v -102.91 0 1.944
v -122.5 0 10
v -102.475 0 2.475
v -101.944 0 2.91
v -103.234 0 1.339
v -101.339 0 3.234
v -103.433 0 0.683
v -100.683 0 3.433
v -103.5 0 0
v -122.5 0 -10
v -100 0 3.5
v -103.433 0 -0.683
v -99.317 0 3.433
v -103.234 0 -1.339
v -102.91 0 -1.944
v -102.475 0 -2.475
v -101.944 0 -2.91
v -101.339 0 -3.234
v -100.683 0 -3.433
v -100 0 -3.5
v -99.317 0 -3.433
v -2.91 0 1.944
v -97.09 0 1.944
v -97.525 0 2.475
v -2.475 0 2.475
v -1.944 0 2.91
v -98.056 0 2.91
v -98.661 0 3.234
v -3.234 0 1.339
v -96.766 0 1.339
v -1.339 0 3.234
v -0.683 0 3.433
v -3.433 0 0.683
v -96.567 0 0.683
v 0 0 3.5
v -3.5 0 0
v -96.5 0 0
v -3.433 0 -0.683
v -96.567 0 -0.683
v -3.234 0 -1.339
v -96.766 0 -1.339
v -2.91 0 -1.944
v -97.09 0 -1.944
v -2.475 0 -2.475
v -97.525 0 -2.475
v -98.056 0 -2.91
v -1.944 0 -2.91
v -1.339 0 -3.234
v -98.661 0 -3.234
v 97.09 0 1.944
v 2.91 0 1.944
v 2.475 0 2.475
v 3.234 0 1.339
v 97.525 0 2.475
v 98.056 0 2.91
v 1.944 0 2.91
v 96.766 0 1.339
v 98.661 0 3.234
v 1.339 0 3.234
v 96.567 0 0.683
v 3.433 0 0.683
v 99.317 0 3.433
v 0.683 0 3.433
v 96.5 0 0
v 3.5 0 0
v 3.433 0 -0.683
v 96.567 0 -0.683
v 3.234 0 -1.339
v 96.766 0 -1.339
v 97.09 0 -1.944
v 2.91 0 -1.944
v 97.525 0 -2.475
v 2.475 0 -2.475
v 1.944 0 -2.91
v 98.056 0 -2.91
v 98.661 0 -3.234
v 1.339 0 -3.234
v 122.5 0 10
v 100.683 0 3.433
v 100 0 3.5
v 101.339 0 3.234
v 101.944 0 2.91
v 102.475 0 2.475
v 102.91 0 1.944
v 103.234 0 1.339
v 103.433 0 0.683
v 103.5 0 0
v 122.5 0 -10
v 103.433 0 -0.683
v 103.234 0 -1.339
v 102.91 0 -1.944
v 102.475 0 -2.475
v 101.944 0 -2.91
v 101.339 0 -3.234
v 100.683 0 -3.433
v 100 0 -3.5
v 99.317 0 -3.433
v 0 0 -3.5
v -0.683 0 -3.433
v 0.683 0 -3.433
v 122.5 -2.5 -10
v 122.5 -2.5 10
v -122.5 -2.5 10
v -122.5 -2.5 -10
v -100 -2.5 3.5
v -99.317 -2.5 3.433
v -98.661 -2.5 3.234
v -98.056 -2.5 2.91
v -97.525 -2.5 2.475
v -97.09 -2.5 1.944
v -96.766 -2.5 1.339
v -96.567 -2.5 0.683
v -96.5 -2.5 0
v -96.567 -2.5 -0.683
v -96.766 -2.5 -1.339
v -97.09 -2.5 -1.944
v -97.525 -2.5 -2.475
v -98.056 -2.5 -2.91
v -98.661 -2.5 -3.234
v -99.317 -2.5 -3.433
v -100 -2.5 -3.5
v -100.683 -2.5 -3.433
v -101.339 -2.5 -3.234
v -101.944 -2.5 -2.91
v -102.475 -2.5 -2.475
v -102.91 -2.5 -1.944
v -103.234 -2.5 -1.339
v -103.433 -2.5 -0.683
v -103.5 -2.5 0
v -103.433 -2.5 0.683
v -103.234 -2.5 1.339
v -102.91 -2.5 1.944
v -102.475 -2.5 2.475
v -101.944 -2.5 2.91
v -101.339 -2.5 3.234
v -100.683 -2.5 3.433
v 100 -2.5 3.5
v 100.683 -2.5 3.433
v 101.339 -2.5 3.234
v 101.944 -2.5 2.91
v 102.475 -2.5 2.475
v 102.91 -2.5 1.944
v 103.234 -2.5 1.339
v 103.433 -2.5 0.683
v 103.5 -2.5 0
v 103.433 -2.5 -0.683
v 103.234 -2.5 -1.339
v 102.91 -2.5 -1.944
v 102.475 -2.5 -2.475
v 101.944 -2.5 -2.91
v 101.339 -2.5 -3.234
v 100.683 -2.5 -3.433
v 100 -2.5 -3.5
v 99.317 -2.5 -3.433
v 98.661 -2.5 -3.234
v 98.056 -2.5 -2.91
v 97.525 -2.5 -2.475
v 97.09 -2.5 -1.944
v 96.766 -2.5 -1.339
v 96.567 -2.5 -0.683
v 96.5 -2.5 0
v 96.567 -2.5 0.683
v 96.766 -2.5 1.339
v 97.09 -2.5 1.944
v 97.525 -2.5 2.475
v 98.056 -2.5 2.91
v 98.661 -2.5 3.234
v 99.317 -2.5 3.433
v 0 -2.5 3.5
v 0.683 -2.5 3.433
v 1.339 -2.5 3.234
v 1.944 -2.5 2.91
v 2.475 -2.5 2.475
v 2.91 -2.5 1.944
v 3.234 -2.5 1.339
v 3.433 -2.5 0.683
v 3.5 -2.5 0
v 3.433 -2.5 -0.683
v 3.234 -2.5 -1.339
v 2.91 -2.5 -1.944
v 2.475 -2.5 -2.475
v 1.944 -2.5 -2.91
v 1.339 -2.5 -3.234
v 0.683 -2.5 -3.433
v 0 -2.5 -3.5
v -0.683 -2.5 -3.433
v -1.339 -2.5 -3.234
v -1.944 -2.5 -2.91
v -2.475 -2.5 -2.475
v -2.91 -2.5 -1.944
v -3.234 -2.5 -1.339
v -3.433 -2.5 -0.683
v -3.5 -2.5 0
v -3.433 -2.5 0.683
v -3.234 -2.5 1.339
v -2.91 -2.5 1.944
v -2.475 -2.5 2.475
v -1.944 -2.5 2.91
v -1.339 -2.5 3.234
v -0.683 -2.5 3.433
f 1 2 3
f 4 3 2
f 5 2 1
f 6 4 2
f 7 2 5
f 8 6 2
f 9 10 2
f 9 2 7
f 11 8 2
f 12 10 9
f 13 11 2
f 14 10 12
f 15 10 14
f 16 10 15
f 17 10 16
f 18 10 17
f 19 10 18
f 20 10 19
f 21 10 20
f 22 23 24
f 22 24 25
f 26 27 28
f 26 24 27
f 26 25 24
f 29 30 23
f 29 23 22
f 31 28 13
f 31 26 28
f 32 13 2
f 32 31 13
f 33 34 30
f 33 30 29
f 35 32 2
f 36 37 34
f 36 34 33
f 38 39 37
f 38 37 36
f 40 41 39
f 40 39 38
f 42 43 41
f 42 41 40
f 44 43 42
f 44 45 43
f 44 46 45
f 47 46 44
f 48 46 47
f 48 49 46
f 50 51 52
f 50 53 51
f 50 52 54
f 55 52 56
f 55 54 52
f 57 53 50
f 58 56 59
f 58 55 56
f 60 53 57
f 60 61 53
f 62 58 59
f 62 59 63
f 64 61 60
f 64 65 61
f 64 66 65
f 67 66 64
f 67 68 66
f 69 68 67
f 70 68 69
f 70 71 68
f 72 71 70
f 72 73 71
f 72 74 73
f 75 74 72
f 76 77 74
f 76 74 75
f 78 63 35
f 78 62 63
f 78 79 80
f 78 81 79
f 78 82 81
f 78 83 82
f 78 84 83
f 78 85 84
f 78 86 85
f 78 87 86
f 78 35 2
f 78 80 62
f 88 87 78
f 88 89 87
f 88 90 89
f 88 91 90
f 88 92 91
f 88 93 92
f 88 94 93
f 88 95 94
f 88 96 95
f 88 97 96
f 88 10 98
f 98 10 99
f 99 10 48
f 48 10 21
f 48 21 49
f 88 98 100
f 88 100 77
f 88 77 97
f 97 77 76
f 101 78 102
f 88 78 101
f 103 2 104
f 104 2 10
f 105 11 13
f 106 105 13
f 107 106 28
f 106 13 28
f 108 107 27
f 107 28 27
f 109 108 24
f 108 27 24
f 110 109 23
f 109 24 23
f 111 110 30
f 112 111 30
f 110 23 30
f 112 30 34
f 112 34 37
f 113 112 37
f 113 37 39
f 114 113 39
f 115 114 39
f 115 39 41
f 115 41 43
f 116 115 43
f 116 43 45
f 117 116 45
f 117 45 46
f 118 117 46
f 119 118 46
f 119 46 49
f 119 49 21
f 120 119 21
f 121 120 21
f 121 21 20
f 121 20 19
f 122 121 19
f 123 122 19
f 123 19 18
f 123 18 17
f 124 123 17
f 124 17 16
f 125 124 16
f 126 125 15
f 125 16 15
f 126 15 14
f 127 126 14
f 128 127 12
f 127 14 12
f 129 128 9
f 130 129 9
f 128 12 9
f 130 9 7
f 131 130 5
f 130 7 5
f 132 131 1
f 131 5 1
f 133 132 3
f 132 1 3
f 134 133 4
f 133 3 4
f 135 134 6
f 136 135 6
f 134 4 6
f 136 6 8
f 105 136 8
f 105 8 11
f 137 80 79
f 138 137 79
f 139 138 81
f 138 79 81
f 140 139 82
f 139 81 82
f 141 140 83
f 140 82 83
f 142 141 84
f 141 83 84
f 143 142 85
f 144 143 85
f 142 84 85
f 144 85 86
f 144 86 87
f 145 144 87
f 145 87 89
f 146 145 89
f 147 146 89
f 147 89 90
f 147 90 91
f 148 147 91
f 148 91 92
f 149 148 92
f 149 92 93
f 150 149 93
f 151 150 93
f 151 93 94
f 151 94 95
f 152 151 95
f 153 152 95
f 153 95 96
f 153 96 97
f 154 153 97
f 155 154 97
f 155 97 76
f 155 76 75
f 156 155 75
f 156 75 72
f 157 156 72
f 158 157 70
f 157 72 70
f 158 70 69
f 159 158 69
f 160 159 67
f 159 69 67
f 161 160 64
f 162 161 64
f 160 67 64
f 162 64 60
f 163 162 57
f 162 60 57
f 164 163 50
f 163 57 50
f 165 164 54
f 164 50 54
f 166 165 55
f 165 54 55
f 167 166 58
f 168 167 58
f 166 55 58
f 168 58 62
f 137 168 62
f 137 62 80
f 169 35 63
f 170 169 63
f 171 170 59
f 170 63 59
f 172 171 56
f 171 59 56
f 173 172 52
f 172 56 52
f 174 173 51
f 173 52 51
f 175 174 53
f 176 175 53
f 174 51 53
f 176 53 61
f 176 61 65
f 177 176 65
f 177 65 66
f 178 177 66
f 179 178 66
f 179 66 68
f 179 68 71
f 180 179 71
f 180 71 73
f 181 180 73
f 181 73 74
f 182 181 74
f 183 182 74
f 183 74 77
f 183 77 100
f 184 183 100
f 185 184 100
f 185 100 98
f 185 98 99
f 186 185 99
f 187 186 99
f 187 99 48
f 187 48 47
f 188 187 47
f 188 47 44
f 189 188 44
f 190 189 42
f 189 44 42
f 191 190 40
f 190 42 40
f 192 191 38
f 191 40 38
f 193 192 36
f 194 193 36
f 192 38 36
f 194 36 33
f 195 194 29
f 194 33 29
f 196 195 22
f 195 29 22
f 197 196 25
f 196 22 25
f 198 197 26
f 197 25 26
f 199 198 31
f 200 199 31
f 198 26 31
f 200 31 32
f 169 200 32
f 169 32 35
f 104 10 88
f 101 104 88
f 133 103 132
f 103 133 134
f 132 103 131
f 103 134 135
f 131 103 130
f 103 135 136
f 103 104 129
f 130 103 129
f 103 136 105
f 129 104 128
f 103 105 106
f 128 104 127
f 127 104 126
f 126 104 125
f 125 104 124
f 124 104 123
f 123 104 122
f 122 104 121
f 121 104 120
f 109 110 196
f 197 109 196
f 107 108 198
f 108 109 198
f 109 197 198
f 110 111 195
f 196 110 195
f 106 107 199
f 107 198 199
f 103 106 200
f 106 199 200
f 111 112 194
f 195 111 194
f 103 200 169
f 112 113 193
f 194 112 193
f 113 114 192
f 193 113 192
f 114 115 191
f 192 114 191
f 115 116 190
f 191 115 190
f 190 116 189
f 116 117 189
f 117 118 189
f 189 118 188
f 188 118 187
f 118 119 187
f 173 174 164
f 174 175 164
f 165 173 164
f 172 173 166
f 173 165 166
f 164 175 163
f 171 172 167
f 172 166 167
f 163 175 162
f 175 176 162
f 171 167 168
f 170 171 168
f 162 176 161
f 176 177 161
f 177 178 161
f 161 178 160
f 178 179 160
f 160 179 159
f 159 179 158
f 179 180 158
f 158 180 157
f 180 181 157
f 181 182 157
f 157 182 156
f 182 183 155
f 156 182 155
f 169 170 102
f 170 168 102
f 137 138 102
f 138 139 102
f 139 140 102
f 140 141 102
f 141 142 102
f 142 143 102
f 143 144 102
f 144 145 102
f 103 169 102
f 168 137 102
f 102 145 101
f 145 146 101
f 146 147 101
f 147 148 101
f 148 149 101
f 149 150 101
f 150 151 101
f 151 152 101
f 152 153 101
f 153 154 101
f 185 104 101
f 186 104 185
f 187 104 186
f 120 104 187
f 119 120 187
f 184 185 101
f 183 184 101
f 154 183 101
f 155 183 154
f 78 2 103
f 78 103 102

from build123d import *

# Parameters (mm, degrees)
SKETCH1_W            = 245
SKETCH1_H            = 20
BASE_FLANGE1_DEPTH   = 2.5
SKETCH6_R            = 3.5
CUT_EXTRUDE1_DEPTH   = 10
LPATTERN1_COUNT      = 6
LPATTERN1_PITCH      = 146
LPATTERN1_COUNT_DIR2 = 6
LPATTERN1_PITCH_DIR2 = 146
LPATTERN2_COUNT      = 2
LPATTERN2_PITCH      = 100
LPATTERN2_COL_COUNT  = 2
LPATTERN2_COL_PITCH  = 100


# Sheet-metal steps are written as plain solids
with BuildPart() as part:
    # Sketch1 → Base-Flange1 (new body)
    with BuildSketch(Plane(origin=(0, 0, 0), x_dir=(1, 0, 0), z_dir=(0, 1, 0))):
        Rectangle(SKETCH1_W, SKETCH1_H)
    extrude(amount=-BASE_FLANGE1_DEPTH)

    # Sketch6 → Cut-Extrude1 (cut)
    with BuildSketch(Plane(origin=(0, 0, 0), x_dir=(1, 0, 0), z_dir=(0, 1, 0))):
        with Locations(Location((0, 0, 0), (0, 0, 270))):
            Circle(SKETCH6_R)
    cut_extrude1 = extrude(amount=-CUT_EXTRUDE1_DEPTH, mode=Mode.SUBTRACT)

    # LPattern1: Cut-Extrude1 6 × 6
    with Locations(*[Vector(-1, 0, 0) * (i * LPATTERN1_PITCH) + Vector(1, 0, 0) * (j * LPATTERN1_PITCH_DIR2) for i in range(LPATTERN1_COUNT) for j in range(LPATTERN1_COUNT_DIR2) if (i, j) != (0, 0)]):
        add(cut_extrude1, mode=Mode.SUBTRACT)

    # LPattern2: Cut-Extrude1 ×2
    with Locations(*[(-i * LPATTERN2_PITCH, 0, 0) for i in range(1, LPATTERN2_COUNT)]):
        add(cut_extrude1, mode=Mode.SUBTRACT)

    # LPattern2 col: Cut-Extrude1 ×2
    with Locations(*[(i * LPATTERN2_COL_PITCH, 0, 0) for i in range(1, LPATTERN2_COL_COUNT)]):
        add(cut_extrude1, mode=Mode.SUBTRACT)


solid = part.part
